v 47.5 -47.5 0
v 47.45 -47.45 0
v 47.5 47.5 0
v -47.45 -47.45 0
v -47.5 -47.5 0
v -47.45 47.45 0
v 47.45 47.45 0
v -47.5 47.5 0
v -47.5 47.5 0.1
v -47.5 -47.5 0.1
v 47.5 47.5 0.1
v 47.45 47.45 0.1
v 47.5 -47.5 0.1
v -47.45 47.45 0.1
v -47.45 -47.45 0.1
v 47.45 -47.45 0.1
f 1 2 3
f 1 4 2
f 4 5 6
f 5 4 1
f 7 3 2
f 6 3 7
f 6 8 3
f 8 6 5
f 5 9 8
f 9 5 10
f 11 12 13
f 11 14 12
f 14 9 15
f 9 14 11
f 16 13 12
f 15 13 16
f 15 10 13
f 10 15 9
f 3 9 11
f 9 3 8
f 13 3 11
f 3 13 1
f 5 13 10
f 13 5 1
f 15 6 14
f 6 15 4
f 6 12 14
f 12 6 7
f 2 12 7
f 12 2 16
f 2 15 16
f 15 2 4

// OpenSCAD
//The length of one side of the square (should be a little smaller than the size of your bed, for my 100mm bed i used 95mm) 
side_length = 95; 
//How wide should the line be?
width = .1;
//How thick should it be? 
thickness = .1;
difference(){
    linear_extrude(height=thickness)
    square(side_length,center=true);
    linear_extrude(height=thickness)
    square(side_length-width,center=true);
}
